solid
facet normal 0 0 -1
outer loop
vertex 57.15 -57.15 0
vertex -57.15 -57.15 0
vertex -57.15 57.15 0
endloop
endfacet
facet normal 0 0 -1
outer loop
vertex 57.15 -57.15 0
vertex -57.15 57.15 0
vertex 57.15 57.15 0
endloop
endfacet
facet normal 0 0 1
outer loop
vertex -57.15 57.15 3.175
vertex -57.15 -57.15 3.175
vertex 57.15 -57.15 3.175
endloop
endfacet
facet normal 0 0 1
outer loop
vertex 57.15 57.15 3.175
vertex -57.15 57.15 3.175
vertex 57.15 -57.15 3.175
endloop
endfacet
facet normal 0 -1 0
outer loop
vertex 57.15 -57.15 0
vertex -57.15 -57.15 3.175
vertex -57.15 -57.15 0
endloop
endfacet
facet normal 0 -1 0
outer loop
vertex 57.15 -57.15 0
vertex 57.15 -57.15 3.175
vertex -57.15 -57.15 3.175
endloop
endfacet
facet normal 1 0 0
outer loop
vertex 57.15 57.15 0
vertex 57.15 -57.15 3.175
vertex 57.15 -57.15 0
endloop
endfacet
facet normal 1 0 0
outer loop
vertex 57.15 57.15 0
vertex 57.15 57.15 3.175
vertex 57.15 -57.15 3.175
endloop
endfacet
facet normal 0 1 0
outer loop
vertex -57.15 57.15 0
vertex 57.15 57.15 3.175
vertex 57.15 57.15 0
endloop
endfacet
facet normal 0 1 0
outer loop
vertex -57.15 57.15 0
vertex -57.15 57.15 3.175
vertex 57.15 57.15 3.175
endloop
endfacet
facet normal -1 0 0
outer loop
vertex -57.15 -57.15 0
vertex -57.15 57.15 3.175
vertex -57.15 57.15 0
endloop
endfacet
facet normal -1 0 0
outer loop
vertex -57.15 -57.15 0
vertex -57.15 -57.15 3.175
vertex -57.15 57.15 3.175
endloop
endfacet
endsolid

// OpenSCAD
/* =====================================================
   Square Plate (solid)
   =====================================================
   Flat square plate, extruded to a solid slab.
   Dimensions are specified in inches and converted to mm.

   Side length : 4.5 in  (114.3 mm)
   Thickness   : 1/8 in  (  3.175 mm)

   Prints flat on the bed, no supports.
   ===================================================== */

in = 25.4;   // mm per inch

/* ── Dimensions (inches) ─────────────────────────────── */
side_in      = 4.5;      // square edge length
thickness_in = 1/8;      // plate thickness

/* ── Derived (mm) ────────────────────────────────────── */
S = side_in      * in;
Z = thickness_in * in;

module square_plate() {
    // Centered on X/Y, sitting on Z = 0.
    linear_extrude(height = Z)
        square([S, S], center = true);
}

square_plate();
